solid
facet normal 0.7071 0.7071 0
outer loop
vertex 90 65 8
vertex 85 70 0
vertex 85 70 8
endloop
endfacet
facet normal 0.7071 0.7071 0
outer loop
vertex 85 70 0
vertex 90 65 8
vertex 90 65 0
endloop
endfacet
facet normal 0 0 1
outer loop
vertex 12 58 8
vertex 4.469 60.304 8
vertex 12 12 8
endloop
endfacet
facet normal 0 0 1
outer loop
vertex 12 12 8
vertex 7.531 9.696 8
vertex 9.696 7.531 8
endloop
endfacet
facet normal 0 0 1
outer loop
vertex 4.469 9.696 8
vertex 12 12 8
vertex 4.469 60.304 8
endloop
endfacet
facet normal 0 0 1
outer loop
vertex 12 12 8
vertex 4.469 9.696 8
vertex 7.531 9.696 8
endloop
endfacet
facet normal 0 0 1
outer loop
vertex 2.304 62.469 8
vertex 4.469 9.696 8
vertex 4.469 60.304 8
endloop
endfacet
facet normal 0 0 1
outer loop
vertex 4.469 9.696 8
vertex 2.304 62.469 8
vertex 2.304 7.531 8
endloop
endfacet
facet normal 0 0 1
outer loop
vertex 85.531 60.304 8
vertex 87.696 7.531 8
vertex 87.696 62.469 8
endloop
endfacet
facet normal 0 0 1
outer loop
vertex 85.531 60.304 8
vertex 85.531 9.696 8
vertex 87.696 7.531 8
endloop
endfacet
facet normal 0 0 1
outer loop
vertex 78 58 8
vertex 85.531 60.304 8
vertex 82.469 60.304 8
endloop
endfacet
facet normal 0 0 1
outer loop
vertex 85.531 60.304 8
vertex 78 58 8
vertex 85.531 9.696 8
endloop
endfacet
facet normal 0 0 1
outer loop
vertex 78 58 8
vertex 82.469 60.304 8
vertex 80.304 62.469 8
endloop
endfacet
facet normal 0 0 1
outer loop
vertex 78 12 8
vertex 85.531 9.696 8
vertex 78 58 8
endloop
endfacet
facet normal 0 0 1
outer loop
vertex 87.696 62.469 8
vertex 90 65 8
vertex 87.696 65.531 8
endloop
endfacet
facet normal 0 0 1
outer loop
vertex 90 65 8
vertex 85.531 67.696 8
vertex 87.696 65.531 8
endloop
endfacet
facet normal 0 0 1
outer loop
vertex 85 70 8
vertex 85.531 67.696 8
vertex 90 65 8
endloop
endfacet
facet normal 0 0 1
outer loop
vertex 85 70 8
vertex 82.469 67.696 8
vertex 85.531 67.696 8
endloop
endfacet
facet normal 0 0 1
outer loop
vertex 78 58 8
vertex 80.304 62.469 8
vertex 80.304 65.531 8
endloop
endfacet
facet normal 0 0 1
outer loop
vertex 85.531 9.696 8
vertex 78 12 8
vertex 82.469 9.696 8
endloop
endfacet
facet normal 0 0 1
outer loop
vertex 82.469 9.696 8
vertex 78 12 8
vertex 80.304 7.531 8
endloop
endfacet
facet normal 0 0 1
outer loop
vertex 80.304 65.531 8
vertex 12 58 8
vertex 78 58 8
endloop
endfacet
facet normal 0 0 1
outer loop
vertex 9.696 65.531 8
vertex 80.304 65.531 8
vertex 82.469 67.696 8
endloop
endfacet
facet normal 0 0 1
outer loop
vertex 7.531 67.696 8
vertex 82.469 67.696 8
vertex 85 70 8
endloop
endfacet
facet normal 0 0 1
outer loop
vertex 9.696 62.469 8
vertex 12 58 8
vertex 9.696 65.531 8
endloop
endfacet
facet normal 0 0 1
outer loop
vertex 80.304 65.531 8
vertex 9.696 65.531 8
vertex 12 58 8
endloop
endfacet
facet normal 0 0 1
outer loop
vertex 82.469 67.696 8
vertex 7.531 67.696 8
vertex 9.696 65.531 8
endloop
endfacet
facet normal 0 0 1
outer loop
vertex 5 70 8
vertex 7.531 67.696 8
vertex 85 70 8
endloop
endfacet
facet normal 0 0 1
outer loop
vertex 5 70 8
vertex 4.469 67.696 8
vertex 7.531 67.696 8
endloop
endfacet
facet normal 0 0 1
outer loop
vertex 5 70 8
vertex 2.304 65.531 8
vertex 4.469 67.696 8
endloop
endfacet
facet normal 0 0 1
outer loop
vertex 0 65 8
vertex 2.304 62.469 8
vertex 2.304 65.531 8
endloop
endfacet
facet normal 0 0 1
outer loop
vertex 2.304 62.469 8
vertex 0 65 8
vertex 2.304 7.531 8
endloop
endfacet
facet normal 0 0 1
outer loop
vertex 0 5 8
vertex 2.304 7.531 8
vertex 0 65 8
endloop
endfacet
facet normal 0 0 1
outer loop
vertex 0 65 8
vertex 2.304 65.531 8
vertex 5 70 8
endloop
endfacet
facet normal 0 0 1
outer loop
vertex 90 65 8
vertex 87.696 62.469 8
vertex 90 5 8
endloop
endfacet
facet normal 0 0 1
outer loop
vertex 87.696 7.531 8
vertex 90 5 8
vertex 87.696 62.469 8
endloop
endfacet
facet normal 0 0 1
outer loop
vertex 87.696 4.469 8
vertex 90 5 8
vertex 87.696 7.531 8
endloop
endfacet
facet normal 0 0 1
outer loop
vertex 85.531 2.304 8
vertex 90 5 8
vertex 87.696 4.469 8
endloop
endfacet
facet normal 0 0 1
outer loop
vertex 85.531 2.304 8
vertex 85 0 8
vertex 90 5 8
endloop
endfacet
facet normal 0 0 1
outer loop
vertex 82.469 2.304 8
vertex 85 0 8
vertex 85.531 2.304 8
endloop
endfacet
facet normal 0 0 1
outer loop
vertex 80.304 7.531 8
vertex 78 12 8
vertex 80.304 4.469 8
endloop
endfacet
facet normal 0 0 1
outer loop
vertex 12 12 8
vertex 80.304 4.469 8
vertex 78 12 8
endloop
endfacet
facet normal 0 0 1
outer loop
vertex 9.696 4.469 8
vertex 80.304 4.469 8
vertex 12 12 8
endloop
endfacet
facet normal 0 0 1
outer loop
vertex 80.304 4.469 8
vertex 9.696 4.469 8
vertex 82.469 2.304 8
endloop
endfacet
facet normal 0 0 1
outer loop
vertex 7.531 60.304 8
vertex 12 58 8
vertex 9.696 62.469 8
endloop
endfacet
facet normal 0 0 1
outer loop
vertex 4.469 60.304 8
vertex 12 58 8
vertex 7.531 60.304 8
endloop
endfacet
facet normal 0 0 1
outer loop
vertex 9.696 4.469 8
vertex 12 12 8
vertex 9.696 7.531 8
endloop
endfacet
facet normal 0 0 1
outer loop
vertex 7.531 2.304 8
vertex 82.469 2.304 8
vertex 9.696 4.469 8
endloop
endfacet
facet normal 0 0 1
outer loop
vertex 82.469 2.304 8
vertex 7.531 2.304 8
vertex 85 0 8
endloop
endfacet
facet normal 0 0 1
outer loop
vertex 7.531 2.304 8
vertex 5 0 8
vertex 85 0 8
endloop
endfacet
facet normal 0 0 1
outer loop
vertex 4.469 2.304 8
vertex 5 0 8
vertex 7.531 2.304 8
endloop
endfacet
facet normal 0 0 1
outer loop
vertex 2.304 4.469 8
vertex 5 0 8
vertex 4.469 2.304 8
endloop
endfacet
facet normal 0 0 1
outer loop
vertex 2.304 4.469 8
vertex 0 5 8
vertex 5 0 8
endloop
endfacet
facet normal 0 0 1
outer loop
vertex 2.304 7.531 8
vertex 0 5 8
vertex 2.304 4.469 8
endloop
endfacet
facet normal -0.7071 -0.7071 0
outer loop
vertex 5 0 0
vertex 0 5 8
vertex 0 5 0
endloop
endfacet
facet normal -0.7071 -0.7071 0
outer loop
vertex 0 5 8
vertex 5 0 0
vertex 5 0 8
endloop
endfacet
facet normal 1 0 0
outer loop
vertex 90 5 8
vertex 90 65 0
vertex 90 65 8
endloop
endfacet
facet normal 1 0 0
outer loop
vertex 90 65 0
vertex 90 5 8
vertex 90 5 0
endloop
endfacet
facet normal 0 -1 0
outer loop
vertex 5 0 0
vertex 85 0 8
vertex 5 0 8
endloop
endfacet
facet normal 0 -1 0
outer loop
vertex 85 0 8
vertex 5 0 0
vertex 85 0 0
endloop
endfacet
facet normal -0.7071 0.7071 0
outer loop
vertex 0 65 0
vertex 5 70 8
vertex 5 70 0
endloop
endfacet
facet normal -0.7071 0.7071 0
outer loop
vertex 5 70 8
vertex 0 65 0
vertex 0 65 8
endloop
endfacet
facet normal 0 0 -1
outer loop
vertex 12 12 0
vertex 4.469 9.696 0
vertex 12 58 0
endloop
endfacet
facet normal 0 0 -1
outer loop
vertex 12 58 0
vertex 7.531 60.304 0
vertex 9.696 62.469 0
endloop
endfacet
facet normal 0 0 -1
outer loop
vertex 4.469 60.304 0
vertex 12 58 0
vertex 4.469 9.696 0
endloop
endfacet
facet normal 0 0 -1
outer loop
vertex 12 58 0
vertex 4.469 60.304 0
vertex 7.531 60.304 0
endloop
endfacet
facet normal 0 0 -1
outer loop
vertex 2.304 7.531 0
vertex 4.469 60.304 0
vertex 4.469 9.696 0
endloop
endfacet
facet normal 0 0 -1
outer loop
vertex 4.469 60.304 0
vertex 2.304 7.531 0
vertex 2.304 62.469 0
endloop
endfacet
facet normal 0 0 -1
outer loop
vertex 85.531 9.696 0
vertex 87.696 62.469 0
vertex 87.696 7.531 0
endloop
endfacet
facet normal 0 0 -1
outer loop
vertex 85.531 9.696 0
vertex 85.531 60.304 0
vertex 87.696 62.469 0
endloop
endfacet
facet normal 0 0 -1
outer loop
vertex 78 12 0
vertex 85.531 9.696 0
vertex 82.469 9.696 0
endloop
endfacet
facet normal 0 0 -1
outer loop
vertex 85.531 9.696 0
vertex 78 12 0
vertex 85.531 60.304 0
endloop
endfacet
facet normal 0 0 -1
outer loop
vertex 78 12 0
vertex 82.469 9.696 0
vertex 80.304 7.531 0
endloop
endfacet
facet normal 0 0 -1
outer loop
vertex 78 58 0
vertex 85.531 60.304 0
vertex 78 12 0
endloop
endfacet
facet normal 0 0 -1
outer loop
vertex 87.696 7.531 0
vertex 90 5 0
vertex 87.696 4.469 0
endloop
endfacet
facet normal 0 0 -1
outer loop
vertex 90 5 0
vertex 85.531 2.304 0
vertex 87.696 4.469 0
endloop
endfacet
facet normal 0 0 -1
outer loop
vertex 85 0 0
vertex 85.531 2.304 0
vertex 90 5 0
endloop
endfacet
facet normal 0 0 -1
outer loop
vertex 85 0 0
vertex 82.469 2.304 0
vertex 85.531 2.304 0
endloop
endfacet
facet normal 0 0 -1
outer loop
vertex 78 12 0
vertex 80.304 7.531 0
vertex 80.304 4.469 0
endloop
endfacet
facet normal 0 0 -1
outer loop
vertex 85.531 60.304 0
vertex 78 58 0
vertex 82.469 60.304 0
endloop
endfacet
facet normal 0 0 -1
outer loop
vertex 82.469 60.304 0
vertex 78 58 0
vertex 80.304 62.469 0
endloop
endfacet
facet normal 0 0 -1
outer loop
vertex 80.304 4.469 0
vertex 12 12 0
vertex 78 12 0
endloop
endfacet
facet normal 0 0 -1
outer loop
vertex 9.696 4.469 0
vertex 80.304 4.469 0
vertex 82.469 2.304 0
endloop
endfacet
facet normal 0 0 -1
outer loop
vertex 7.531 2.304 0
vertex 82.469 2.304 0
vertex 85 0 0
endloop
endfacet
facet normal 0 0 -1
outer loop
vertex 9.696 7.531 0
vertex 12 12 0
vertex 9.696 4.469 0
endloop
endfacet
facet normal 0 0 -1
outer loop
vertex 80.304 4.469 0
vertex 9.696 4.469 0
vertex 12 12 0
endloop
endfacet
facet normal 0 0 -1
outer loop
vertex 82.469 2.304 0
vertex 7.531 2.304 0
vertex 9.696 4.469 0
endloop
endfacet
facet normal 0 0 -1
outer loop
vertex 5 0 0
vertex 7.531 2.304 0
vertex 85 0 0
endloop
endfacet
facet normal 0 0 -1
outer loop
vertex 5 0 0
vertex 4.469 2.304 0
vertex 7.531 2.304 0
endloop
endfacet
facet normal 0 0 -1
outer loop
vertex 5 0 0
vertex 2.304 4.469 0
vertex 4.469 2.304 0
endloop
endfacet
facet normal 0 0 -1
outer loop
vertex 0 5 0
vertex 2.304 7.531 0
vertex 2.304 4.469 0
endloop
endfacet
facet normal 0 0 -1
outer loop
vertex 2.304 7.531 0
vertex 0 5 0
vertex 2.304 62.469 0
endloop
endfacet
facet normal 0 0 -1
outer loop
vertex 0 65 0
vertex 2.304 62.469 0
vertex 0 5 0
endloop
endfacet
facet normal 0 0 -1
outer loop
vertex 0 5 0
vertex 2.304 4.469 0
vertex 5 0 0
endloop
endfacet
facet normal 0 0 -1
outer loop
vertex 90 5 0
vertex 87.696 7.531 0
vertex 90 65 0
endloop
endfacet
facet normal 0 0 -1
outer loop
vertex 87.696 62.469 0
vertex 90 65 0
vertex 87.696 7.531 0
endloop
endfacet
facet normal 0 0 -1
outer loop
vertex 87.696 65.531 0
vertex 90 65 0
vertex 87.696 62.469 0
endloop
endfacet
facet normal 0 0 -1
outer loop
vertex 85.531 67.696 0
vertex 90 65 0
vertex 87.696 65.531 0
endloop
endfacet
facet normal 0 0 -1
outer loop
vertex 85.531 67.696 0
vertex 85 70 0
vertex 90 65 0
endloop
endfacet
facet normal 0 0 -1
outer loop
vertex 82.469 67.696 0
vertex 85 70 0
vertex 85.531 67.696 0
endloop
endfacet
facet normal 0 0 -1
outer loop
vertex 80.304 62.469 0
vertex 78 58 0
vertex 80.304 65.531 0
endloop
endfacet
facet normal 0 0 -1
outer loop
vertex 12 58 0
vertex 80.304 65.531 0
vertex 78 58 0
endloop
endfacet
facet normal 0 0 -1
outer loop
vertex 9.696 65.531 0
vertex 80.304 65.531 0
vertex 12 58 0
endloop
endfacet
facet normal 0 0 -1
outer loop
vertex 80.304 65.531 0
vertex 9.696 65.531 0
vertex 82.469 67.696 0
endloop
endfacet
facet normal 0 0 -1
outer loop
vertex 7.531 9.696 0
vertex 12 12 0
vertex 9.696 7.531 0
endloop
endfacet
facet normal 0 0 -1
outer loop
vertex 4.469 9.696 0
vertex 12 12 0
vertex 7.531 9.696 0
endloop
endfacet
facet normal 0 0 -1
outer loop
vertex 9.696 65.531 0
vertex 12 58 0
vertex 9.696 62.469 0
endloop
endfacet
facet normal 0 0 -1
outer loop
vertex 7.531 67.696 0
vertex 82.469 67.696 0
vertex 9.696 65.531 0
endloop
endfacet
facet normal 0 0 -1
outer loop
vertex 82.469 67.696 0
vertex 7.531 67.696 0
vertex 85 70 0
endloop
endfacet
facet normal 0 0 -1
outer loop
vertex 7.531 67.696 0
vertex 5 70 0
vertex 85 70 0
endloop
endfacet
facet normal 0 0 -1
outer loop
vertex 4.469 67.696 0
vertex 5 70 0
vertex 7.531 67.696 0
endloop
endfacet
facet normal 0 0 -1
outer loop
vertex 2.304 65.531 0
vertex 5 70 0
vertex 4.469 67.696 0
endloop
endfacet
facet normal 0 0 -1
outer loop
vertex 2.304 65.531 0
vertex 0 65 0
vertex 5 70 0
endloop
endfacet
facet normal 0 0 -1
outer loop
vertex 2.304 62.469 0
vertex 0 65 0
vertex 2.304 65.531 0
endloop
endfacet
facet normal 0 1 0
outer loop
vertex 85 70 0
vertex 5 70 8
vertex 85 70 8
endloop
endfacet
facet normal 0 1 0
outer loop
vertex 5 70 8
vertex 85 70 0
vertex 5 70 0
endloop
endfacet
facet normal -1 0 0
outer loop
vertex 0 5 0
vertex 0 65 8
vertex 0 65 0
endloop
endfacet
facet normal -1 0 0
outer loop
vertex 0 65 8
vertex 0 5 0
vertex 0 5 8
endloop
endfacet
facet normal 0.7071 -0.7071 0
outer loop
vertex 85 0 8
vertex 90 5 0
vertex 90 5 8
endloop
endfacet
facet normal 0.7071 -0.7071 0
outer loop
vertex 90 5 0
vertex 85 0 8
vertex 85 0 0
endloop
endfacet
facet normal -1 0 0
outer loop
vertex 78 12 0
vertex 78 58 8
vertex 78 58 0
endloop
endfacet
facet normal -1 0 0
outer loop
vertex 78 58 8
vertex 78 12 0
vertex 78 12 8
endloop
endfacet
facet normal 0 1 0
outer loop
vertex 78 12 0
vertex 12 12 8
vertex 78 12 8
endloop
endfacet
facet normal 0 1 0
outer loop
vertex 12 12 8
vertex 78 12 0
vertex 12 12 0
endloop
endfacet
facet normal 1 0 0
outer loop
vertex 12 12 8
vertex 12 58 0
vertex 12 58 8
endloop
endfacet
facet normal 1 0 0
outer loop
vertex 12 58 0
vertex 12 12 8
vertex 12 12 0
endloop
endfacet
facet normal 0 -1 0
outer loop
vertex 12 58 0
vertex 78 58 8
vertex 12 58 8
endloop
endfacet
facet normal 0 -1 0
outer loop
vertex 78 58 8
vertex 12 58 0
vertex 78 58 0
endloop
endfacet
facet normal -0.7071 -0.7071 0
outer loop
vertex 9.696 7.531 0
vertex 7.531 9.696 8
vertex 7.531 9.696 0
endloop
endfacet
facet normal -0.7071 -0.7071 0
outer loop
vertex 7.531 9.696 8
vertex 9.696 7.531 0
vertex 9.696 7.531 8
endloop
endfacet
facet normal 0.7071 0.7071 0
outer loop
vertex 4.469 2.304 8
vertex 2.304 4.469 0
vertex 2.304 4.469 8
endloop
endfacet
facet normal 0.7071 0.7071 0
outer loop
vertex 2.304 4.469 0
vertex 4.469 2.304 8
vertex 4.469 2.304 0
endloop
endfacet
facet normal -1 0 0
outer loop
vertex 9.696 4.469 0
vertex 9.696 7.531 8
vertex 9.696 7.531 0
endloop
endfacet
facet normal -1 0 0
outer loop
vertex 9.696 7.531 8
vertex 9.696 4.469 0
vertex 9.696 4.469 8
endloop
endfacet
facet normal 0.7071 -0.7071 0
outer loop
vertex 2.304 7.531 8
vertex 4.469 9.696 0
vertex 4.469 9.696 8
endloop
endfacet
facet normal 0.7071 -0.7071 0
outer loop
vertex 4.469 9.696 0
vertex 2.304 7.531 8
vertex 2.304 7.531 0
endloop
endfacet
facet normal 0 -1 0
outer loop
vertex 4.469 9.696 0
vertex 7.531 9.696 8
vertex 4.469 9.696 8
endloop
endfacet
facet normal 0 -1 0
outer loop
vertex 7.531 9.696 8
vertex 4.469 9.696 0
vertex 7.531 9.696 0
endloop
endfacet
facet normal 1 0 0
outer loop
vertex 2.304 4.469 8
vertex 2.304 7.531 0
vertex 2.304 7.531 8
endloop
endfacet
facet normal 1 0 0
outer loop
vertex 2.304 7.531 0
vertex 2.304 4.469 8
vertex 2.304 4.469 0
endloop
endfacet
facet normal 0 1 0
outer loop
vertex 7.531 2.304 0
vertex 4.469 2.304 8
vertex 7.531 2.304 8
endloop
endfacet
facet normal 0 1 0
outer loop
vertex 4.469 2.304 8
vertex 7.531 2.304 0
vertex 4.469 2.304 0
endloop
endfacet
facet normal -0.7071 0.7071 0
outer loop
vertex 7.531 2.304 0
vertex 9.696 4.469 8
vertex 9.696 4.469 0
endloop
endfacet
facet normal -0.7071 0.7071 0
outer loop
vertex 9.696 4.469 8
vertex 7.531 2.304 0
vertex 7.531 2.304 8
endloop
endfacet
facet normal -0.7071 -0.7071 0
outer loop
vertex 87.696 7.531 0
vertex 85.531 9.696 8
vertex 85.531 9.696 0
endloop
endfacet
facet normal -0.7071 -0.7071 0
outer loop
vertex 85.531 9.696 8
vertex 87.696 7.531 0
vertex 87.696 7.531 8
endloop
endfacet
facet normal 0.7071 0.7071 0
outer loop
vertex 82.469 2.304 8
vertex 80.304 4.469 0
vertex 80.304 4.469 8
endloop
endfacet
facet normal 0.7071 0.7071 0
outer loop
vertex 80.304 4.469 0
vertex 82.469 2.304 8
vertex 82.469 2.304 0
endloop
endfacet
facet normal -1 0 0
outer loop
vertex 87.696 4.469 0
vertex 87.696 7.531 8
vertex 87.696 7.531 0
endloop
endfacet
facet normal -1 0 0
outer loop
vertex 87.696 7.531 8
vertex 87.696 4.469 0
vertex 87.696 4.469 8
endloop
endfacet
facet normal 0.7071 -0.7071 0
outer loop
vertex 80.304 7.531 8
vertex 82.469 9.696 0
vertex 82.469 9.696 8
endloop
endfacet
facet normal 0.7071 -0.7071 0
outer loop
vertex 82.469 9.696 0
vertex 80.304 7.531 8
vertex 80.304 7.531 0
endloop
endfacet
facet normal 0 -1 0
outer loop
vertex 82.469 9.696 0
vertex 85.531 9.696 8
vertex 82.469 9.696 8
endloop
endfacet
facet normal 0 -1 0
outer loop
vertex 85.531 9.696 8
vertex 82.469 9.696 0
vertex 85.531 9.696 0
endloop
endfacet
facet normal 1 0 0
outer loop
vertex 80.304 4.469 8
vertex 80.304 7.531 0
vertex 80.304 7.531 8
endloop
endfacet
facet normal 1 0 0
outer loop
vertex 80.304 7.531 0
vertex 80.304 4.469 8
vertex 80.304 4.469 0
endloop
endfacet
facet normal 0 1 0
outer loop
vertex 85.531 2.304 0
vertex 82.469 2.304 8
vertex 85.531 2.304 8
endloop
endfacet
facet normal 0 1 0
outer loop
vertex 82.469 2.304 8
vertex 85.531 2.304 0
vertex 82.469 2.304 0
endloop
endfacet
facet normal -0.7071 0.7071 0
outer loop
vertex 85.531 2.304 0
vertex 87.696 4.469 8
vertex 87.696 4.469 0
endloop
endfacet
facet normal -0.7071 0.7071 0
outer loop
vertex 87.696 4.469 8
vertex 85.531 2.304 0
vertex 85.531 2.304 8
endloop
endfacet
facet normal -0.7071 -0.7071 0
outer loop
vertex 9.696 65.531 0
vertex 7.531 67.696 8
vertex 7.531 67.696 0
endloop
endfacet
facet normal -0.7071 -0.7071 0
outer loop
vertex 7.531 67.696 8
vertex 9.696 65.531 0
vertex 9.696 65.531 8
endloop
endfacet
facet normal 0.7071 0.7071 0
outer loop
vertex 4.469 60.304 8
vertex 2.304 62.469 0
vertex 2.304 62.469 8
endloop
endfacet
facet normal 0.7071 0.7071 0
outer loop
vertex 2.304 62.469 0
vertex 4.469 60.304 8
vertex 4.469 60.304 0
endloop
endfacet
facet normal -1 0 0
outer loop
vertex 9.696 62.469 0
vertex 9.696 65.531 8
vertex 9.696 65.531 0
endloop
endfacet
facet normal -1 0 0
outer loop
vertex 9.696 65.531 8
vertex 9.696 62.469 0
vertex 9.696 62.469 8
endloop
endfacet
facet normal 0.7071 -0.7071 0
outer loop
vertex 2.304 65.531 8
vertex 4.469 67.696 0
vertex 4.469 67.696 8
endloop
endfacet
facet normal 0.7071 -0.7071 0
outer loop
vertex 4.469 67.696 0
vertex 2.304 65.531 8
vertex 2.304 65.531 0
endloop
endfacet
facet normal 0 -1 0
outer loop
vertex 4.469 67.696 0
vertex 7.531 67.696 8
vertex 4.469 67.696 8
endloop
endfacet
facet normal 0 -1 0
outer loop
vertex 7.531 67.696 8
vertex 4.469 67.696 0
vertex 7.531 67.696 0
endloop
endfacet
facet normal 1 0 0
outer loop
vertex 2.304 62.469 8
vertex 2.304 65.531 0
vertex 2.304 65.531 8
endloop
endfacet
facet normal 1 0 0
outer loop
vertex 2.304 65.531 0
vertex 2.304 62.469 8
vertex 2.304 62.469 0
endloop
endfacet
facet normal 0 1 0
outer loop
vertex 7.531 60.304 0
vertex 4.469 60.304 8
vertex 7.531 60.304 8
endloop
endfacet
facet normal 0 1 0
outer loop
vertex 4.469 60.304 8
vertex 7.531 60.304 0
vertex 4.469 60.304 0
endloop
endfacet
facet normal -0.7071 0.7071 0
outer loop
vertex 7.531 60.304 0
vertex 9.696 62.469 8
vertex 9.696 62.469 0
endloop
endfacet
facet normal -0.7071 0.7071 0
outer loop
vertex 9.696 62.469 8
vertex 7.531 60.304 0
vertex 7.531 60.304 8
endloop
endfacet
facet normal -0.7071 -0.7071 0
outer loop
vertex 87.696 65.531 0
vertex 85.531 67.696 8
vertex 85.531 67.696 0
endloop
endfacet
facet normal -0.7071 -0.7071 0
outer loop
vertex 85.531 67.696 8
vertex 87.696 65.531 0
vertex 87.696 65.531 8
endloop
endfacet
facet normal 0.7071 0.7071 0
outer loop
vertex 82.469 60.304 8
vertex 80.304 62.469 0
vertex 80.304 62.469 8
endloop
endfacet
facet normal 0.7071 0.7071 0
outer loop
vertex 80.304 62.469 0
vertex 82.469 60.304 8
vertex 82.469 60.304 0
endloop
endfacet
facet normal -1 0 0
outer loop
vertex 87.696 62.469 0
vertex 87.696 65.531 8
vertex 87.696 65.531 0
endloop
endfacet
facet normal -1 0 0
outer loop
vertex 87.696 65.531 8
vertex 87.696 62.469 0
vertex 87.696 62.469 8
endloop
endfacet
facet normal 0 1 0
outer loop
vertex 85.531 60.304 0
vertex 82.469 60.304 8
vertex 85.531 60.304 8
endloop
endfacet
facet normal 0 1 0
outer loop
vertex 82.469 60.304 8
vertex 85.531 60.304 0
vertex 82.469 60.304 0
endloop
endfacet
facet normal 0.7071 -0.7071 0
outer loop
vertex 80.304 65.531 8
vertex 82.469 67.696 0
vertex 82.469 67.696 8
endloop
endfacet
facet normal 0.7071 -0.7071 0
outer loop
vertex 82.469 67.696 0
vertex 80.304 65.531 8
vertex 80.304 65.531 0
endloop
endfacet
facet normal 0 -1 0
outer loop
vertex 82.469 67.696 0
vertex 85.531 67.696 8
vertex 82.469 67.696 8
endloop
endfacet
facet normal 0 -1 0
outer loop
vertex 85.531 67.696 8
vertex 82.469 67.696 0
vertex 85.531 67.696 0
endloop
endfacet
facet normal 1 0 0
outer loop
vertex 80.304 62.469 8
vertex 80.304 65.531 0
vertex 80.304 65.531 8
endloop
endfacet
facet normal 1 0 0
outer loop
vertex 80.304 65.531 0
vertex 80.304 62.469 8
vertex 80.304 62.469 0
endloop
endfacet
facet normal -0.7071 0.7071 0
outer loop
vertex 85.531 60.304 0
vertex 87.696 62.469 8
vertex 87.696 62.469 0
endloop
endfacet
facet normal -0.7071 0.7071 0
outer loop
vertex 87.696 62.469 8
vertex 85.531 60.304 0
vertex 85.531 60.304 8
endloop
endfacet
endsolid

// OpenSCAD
$fn = 32;

// ----------------------------------------------------------------------
// Frame plate: 90 x 70 frame, 12 mm rails
// ----------------------------------------------------------------------

// --- parameters (mm) ---
plate_l = 90;             // plate length, X
plate_w = 70;             // plate width, Y
plate_t = 8;              // plate thickness, Z (extrusion height)
corner_c = 5;             // corner chamfer
frame_bar = 12;           // frame rail width
bolt_r = 4;               // corner bolt window radius
bolt_inset = 6;           // bolt centre inset from the edges

win_l = plate_l - 2 * frame_bar;  // window length
win_w = plate_w - 2 * frame_bar;  // window width
bolt_d = 2 * bolt_r;  // corner hole diameter

profile = [[5, 0], [85, 0], [90, 5], [90, 65], [85, 70], [5, 70], [0, 65], [0, 5]];  // primary outline, 8 points, counter clockwise
void_1 = [[12, 12], [78, 12], [78, 58], [12, 58]];  // the window, 4 points
void_2 = [[9.696, 7.531], [7.531, 9.696], [4.469, 9.696], [2.304, 7.531], [2.304, 4.469], [4.469, 2.304], [7.531, 2.304], [9.696, 4.469]];  // corner bolt window, 8 points
void_3 = [[87.696, 7.531], [85.531, 9.696], [82.469, 9.696], [80.304, 7.531], [80.304, 4.469], [82.469, 2.304], [85.531, 2.304], [87.696, 4.469]];  // corner bolt window, 8 points
void_4 = [[9.696, 65.531], [7.531, 67.696], [4.469, 67.696], [2.304, 65.531], [2.304, 62.469], [4.469, 60.304], [7.531, 60.304], [9.696, 62.469]];  // corner bolt window, 8 points
void_5 = [[87.696, 65.531], [85.531, 67.696], [82.469, 67.696], [80.304, 65.531], [80.304, 62.469], [82.469, 60.304], [85.531, 60.304], [87.696, 62.469]];  // corner bolt window, 8 points

// --- the one profile operation ---
difference() {
  linear_extrude(height = plate_t) polygon(points = profile);
  translate([0, 0, -1])
    linear_extrude(height = plate_t + 2) polygon(points = void_1);
  translate([0, 0, -1])
    linear_extrude(height = plate_t + 2) polygon(points = void_2);
  translate([0, 0, -1])
    linear_extrude(height = plate_t + 2) polygon(points = void_3);
  translate([0, 0, -1])
    linear_extrude(height = plate_t + 2) polygon(points = void_4);
  translate([0, 0, -1])
    linear_extrude(height = plate_t + 2) polygon(points = void_5);
}
